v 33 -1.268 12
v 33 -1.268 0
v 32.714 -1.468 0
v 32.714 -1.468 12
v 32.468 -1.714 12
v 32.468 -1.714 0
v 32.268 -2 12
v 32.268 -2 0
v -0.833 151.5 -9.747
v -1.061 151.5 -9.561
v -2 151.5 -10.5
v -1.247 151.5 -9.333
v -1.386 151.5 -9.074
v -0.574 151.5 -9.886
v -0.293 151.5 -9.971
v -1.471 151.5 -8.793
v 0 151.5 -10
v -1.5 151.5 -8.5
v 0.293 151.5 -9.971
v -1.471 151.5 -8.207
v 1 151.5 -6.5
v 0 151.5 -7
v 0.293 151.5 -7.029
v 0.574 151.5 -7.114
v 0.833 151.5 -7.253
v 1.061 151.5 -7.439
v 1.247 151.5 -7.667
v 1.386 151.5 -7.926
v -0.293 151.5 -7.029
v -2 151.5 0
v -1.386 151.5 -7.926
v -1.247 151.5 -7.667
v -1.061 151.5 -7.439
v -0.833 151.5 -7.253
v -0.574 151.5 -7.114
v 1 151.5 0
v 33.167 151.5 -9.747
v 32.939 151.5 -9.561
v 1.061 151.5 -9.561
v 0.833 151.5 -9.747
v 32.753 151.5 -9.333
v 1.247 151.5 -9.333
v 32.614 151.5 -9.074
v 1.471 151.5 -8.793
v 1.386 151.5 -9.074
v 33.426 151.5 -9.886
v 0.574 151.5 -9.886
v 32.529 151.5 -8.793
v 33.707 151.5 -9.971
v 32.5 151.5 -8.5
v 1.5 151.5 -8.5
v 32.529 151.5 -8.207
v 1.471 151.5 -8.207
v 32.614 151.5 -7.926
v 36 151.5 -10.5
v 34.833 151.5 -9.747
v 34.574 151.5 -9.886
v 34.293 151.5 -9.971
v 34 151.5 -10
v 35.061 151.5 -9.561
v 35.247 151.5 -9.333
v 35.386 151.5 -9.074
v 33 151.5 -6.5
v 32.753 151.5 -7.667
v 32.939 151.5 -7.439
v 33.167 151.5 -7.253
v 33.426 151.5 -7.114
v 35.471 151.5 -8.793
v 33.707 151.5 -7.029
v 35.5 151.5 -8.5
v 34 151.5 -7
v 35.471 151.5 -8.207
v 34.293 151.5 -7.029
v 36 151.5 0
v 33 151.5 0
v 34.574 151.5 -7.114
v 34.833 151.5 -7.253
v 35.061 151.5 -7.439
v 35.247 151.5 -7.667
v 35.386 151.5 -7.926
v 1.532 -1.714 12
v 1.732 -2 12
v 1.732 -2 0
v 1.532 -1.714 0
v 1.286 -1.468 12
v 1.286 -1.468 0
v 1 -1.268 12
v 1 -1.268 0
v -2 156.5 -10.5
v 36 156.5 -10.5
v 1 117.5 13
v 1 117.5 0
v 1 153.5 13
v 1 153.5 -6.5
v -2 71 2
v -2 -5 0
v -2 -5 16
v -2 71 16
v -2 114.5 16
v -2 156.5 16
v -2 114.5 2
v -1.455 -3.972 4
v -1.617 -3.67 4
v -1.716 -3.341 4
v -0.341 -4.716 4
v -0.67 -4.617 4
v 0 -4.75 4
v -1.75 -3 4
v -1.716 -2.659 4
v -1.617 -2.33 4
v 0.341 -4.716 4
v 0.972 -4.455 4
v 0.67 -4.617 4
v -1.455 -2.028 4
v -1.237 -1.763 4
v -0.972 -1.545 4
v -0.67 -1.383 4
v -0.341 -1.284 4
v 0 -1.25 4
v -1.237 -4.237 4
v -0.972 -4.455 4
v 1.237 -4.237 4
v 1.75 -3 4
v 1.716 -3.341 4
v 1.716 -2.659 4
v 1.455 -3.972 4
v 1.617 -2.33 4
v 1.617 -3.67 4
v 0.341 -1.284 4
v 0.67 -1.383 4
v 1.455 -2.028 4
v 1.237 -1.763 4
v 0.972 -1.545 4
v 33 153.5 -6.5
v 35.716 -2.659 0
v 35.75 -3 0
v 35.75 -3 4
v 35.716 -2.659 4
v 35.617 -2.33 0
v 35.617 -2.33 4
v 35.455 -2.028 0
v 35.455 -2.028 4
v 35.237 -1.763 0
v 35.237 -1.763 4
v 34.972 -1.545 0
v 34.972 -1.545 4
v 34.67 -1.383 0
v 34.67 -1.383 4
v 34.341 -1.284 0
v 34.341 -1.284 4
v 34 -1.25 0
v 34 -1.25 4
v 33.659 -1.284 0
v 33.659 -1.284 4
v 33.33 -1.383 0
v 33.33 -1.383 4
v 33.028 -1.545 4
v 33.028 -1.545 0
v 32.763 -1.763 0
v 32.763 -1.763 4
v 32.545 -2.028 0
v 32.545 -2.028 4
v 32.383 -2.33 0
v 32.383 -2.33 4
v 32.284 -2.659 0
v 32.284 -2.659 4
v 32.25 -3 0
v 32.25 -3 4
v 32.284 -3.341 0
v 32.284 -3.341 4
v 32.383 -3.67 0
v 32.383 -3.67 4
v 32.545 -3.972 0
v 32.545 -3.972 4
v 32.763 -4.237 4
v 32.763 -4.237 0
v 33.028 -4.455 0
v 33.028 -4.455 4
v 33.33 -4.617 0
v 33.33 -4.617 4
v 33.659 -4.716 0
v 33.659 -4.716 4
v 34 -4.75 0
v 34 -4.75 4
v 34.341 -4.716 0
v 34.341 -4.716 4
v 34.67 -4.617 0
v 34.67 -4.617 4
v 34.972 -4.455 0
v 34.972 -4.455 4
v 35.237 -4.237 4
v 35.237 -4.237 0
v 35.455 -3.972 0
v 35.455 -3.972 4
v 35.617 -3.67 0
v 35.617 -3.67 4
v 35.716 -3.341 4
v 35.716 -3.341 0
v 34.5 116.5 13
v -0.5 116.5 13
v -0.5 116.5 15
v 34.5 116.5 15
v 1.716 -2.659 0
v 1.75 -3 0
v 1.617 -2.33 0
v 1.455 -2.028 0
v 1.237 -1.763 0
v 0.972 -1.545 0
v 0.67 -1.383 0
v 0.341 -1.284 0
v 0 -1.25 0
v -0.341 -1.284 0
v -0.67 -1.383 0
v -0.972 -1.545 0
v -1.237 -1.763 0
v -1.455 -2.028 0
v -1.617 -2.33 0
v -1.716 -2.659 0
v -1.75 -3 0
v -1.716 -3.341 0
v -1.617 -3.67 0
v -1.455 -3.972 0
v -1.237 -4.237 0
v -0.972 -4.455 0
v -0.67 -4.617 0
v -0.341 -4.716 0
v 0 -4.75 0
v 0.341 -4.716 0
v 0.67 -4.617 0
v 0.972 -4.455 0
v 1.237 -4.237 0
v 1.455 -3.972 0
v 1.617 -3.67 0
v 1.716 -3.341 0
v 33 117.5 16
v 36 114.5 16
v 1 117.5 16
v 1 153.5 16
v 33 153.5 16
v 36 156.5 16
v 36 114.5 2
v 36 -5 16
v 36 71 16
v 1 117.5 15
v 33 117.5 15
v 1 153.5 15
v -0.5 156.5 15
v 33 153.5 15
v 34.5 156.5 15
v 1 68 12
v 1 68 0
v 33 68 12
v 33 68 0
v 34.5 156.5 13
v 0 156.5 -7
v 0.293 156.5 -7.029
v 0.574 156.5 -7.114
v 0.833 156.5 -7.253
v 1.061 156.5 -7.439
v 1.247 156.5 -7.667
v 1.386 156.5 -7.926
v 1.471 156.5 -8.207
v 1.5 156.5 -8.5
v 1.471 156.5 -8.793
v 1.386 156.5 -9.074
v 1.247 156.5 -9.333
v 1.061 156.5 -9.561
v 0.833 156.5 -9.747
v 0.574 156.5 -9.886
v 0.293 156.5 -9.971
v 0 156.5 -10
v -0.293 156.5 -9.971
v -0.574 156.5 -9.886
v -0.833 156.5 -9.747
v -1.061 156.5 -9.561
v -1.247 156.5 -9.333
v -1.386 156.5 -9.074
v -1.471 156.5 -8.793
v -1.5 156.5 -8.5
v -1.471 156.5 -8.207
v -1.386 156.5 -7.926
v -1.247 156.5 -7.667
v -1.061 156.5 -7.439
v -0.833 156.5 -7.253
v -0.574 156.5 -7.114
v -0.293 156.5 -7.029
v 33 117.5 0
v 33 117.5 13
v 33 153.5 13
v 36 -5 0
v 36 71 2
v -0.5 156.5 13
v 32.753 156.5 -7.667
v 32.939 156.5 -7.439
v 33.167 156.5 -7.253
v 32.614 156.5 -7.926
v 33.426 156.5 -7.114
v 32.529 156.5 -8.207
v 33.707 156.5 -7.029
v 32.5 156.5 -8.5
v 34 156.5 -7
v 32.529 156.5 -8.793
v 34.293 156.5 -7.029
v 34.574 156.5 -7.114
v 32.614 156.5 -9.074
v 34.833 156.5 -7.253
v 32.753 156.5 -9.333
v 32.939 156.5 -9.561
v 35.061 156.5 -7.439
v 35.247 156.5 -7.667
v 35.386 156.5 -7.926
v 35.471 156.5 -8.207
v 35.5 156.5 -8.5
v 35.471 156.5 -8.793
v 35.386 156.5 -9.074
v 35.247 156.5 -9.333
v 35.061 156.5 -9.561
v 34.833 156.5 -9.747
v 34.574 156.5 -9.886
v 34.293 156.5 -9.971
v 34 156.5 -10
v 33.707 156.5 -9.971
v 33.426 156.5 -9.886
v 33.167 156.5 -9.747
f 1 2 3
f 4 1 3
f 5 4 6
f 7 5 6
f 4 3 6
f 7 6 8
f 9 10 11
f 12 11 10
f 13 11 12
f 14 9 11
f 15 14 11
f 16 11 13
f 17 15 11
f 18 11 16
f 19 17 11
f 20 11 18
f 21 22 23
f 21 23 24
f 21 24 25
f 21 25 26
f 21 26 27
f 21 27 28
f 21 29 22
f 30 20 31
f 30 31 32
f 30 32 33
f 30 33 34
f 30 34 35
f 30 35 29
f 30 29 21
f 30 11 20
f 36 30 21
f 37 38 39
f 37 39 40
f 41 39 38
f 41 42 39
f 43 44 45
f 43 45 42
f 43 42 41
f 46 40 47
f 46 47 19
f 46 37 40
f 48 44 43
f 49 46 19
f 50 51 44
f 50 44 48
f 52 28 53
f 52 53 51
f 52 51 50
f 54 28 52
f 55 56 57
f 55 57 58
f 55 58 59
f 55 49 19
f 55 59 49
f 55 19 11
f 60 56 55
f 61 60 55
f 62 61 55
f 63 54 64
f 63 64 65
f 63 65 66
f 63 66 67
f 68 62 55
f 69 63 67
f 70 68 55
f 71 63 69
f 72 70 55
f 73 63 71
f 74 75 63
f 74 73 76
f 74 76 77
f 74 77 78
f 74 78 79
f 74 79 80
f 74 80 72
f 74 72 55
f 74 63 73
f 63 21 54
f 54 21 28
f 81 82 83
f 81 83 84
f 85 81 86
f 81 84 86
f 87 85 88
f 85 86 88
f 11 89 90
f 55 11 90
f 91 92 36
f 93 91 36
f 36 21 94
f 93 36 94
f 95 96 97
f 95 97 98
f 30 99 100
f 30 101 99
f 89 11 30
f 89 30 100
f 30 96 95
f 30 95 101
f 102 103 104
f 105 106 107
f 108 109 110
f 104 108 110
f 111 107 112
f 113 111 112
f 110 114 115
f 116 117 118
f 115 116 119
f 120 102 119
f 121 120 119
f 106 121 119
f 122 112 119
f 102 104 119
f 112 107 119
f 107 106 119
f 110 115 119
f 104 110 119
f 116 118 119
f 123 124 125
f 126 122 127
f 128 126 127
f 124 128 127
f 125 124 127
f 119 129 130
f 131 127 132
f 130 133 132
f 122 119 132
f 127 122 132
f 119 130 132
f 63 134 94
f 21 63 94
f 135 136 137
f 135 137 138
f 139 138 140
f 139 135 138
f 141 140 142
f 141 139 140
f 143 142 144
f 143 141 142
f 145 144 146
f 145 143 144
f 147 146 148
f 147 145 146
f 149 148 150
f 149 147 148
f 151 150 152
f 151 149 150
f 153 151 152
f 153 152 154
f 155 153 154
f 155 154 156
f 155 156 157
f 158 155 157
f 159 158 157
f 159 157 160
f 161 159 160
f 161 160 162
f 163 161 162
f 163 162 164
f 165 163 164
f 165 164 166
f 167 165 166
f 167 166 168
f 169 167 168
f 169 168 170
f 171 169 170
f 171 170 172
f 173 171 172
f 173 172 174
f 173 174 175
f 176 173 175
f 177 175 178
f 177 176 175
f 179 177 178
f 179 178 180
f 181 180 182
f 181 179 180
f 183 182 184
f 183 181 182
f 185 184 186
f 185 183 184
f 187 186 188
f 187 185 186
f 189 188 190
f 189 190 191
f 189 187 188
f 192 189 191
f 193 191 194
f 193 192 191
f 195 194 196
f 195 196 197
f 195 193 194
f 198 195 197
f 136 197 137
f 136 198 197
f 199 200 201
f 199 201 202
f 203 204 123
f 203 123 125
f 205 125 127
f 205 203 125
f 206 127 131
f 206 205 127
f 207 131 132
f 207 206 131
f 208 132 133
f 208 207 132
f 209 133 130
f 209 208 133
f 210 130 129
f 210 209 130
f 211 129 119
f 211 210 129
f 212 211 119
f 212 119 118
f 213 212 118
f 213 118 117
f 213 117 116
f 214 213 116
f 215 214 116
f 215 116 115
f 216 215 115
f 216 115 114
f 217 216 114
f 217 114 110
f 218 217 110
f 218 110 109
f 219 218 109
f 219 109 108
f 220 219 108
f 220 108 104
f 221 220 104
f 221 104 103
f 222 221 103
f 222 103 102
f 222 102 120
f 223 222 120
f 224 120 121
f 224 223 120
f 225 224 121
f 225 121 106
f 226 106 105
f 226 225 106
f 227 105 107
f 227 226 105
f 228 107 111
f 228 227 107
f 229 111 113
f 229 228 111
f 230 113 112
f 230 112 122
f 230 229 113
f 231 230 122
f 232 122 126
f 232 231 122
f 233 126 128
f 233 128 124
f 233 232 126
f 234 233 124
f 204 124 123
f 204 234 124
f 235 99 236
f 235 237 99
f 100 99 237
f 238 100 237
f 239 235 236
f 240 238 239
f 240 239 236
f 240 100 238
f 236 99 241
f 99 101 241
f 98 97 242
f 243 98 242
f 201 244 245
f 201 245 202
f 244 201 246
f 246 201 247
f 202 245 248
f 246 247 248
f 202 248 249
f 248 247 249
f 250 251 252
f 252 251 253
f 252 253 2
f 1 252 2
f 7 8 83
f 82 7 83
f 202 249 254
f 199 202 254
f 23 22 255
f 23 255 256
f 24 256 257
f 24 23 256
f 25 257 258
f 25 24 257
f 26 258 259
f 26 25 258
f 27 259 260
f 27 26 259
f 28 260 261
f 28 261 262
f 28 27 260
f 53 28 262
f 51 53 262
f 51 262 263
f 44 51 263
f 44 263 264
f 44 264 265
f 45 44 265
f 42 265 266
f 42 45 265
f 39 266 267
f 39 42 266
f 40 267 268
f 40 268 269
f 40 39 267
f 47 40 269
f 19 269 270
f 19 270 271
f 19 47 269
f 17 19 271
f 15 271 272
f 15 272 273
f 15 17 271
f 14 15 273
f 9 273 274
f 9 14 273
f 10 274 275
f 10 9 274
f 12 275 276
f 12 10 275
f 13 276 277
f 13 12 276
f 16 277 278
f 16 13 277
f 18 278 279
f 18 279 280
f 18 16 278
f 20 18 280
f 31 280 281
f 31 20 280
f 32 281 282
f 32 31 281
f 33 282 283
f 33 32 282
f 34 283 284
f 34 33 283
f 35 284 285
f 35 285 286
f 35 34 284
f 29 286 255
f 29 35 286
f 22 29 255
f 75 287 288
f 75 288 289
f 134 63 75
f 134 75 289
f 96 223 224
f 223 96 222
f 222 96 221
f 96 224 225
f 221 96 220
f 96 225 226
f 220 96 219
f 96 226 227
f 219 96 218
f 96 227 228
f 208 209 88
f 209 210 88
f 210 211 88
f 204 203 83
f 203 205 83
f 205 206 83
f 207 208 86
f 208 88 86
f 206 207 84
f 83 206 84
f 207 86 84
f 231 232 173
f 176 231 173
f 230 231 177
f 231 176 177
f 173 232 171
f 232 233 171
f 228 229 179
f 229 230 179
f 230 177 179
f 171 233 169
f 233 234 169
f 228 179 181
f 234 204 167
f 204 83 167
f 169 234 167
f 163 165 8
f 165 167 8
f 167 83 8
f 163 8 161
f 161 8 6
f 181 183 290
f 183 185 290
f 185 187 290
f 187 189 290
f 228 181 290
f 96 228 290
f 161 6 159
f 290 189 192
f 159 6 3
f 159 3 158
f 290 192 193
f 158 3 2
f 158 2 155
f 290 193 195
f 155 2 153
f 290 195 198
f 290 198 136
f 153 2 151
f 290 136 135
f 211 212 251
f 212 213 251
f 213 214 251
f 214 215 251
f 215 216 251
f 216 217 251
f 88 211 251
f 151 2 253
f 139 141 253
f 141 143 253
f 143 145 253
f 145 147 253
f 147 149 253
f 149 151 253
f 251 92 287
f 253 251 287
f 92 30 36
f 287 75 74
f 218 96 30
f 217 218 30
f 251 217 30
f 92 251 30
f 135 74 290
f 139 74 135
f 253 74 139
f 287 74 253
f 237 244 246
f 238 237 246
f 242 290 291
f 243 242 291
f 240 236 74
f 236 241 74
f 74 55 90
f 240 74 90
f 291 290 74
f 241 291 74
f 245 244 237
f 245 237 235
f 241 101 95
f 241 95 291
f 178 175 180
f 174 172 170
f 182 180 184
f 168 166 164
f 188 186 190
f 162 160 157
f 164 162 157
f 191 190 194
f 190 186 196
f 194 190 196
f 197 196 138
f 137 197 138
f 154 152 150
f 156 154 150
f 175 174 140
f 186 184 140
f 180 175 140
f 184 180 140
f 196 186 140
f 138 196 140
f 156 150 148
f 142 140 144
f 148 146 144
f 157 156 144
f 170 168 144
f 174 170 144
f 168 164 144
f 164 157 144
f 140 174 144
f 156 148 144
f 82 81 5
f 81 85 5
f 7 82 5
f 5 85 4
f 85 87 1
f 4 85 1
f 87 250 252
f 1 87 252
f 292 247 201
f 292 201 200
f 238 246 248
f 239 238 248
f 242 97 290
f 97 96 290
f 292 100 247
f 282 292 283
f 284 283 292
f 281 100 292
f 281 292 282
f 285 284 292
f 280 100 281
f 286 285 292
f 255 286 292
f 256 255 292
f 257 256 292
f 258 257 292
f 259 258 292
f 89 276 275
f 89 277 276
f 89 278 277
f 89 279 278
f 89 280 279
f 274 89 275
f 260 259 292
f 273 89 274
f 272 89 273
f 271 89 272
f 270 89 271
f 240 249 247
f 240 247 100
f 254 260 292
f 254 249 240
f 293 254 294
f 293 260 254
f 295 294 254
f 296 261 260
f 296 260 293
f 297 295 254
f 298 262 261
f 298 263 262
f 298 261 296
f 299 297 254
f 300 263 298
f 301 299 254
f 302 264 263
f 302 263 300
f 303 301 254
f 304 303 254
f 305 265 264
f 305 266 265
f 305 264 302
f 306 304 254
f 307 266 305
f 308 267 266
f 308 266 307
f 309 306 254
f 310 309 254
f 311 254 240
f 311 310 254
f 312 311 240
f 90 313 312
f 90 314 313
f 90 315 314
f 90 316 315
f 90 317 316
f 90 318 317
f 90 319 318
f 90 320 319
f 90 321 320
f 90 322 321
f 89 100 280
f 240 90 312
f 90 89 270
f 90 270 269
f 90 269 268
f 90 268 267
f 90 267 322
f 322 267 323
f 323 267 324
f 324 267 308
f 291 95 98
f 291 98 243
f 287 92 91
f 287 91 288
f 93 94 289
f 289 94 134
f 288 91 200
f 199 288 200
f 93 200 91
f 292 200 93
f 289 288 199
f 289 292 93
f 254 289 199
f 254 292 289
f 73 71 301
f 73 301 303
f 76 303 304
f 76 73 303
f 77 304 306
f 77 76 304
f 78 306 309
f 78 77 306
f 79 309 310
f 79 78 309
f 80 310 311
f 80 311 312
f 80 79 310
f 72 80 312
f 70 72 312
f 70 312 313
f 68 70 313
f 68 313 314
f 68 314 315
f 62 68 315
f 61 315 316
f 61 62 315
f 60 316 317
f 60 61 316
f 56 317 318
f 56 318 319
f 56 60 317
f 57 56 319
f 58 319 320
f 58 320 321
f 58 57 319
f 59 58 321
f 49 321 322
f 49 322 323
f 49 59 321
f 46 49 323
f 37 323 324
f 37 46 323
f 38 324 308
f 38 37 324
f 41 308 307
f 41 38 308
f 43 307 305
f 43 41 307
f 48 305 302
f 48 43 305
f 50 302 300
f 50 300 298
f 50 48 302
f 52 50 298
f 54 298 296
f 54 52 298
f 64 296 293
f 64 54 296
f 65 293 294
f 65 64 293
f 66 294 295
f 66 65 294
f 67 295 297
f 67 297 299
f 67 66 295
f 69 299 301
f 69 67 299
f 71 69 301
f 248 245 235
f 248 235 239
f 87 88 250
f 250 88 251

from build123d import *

# Parameters (mm, degrees)
P_IDAT_VYSUNUT_M1_DEPTH   = 12
SKICA2_R                  = 1.75
P_IDAT_VYSUNUT_M1_2_DEPTH = 12
SKICA3_W                  = 38
SKICA3_H                  = 43.5
P_IDAT_VYSUNUT_M2_DEPTH   = 2
P_IDAT_VYSUNUT_M3_DEPTH   = 10.5
SKICA5_W                  = 38
SKICA5_H                  = 5
P_IDAT_VYSUNUT_M4_DEPTH   = 4
SKICA7_W                  = 38
SKICA7_H                  = 76
P_IDAT_VYSUNUT_M5_DEPTH   = 4
SKICA8_W                  = 38
SKICA8_H                  = 42
SKICA8_W_2                = 32
SKICA8_H_2                = 36
P_IDAT_VYSUNUT_M6_DEPTH   = 4
SKICA9_W                  = 35
SKICA9_H                  = 2
ODEBRAT_VYSUNUT_M2_DEPTH  = 40
ODEBRAT_START             = -5
SKICA11_R                 = 1.5
ODEBRAT_VYSUNUT_M3_DEPTH  = 5
P_IDAT_START              = -12
SKICA13_R                 = 1.75
P_IDAT_VYSUNUT_M7_DEPTH   = 12


with BuildPart() as part:
    # Skica2 → Přidat vysunutím1 (new body)
    with BuildSketch(Plane.XY):
        Polygon((36, 151.5), (36, 114.5), (33, 114.5), (1, 114.5), (-2, 114.5), (-2, 151.5), (-2, 156.5), (36, 156.5), align=None)
        Polygon((33, 151.5), (33, 117.5), (1, 117.5), (1, 151.5), (1, 153.5), (33, 153.5), align=None, mode=Mode.SUBTRACT)
    extrude(amount=P_IDAT_VYSUNUT_M1_DEPTH)



with BuildPart() as body_2:
    # Skica2 → P_idat vysunut_m1 2 (new body)
    with BuildSketch(Plane.XY):
        Polygon((36, -5), (33, -5), (1, -5), (-2, -5), (-2, 71), (1, 71), (33, 71), (36, 71), align=None)
        with Locations((0, -3)):
            Circle(SKICA2_R, mode=Mode.SUBTRACT)
        with Locations((34, -3)):
            Circle(SKICA2_R, mode=Mode.SUBTRACT)
        with BuildLine():
            Line((1, 68), (33, 68))
            Line((33, 68), (33, -1.267949192))
            ThreePointArc((33, -1.267949192), (32.585786438, -1.585786438), (32.267949192, -2))
            Line((32.267949192, -2), (1.732050808, -2))
            ThreePointArc((1.732050808, -2), (1.414213562, -1.585786438), (1, -1.267949192))
            Line((1, -1.267949192), (1, 68))
        make_face(mode=Mode.SUBTRACT)
    extrude(amount=P_IDAT_VYSUNUT_M1_2_DEPTH)


with BuildPart() as part_1:
    add(part.part)

    add(body_2.part)  # Přidat vysunutím2 merges body 2
    # Skica3 → Přidat vysunutím2 (add)
    with BuildSketch(Plane.XY):
        with Locations((17, 92.75)):
            Rectangle(SKICA3_W, SKICA3_H)
    extrude(amount=P_IDAT_VYSUNUT_M2_DEPTH)

    # Skica4 → Přidat vysunutím3 (add)
    with BuildSketch(Plane(origin=(0, 0, 0), x_dir=(-1, 0, 0), z_dir=(0, 0, -1))):
        Polygon((-36, 156.5), (2, 156.5), (2, 154.5), (2, 151.5), (-1, 151.5), (-1, 153.5), (-33, 153.5), (-33, 151.5), (-36, 151.5), (-36, 154.5), align=None)
    extrude(amount=P_IDAT_VYSUNUT_M3_DEPTH)

    # Skica5 → Přidat vysunutím4 (add)
    with BuildSketch(Plane(origin=(0, 0, -10.5), x_dir=(-1, 0, 0), z_dir=(0, 0, -1))):
        with Locations((-17, 154)):
            Rectangle(SKICA5_W, SKICA5_H)
    extrude(amount=-P_IDAT_VYSUNUT_M4_DEPTH)

    # Skica7 → Přidat vysunutím5 (add)
    with BuildSketch(Plane.XY.offset(12)):
        with Locations((17, 33)):
            Rectangle(SKICA7_W, SKICA7_H)
    extrude(amount=P_IDAT_VYSUNUT_M5_DEPTH)

    # Skica8 → Přidat vysunutím6 (add)
    with BuildSketch(Plane.XY.offset(12)):
        with Locations((17, 135.5)):
            Rectangle(SKICA8_W, SKICA8_H)
        with Locations((17, 135.5)):
            Rectangle(SKICA8_W_2, SKICA8_H_2, mode=Mode.SUBTRACT)
    extrude(amount=P_IDAT_VYSUNUT_M6_DEPTH)

    # Skica9 → Odebrat vysunutím2 (cut)
    with BuildSketch(Plane(origin=(0, 156.5, 0), x_dir=(1, 0, 0), z_dir=(0, 1, 0))):
        with Locations((17, -14)):
            Rectangle(SKICA9_W, SKICA9_H)
    extrude(amount=-ODEBRAT_VYSUNUT_M2_DEPTH, mode=Mode.SUBTRACT)

    # Skica11 → Odebrat vysunutím3 (cut)
    with BuildSketch(Plane(origin=(0, 156.5, 0), x_dir=(1, 0, 0), z_dir=(0, 1, 0)).offset(ODEBRAT_START)):
        with Locations(Location((0, 8.5, 0), (0, 0, 270))):
            Circle(SKICA11_R)
        with Locations(Location((34, 8.5, 0), (0, 0, 270))):
            Circle(SKICA11_R)
    extrude(amount=ODEBRAT_VYSUNUT_M3_DEPTH, mode=Mode.SUBTRACT)

    # Skica13 → Přidat vysunutím7 (add)
    with BuildSketch(Plane.XY.offset(16).offset(P_IDAT_START)):
        with Locations((0, -3)):
            Circle(SKICA13_R)
        with Locations((34, -3)):
            Circle(SKICA13_R)
    extrude(amount=P_IDAT_VYSUNUT_M7_DEPTH)


solid = part_1.part
